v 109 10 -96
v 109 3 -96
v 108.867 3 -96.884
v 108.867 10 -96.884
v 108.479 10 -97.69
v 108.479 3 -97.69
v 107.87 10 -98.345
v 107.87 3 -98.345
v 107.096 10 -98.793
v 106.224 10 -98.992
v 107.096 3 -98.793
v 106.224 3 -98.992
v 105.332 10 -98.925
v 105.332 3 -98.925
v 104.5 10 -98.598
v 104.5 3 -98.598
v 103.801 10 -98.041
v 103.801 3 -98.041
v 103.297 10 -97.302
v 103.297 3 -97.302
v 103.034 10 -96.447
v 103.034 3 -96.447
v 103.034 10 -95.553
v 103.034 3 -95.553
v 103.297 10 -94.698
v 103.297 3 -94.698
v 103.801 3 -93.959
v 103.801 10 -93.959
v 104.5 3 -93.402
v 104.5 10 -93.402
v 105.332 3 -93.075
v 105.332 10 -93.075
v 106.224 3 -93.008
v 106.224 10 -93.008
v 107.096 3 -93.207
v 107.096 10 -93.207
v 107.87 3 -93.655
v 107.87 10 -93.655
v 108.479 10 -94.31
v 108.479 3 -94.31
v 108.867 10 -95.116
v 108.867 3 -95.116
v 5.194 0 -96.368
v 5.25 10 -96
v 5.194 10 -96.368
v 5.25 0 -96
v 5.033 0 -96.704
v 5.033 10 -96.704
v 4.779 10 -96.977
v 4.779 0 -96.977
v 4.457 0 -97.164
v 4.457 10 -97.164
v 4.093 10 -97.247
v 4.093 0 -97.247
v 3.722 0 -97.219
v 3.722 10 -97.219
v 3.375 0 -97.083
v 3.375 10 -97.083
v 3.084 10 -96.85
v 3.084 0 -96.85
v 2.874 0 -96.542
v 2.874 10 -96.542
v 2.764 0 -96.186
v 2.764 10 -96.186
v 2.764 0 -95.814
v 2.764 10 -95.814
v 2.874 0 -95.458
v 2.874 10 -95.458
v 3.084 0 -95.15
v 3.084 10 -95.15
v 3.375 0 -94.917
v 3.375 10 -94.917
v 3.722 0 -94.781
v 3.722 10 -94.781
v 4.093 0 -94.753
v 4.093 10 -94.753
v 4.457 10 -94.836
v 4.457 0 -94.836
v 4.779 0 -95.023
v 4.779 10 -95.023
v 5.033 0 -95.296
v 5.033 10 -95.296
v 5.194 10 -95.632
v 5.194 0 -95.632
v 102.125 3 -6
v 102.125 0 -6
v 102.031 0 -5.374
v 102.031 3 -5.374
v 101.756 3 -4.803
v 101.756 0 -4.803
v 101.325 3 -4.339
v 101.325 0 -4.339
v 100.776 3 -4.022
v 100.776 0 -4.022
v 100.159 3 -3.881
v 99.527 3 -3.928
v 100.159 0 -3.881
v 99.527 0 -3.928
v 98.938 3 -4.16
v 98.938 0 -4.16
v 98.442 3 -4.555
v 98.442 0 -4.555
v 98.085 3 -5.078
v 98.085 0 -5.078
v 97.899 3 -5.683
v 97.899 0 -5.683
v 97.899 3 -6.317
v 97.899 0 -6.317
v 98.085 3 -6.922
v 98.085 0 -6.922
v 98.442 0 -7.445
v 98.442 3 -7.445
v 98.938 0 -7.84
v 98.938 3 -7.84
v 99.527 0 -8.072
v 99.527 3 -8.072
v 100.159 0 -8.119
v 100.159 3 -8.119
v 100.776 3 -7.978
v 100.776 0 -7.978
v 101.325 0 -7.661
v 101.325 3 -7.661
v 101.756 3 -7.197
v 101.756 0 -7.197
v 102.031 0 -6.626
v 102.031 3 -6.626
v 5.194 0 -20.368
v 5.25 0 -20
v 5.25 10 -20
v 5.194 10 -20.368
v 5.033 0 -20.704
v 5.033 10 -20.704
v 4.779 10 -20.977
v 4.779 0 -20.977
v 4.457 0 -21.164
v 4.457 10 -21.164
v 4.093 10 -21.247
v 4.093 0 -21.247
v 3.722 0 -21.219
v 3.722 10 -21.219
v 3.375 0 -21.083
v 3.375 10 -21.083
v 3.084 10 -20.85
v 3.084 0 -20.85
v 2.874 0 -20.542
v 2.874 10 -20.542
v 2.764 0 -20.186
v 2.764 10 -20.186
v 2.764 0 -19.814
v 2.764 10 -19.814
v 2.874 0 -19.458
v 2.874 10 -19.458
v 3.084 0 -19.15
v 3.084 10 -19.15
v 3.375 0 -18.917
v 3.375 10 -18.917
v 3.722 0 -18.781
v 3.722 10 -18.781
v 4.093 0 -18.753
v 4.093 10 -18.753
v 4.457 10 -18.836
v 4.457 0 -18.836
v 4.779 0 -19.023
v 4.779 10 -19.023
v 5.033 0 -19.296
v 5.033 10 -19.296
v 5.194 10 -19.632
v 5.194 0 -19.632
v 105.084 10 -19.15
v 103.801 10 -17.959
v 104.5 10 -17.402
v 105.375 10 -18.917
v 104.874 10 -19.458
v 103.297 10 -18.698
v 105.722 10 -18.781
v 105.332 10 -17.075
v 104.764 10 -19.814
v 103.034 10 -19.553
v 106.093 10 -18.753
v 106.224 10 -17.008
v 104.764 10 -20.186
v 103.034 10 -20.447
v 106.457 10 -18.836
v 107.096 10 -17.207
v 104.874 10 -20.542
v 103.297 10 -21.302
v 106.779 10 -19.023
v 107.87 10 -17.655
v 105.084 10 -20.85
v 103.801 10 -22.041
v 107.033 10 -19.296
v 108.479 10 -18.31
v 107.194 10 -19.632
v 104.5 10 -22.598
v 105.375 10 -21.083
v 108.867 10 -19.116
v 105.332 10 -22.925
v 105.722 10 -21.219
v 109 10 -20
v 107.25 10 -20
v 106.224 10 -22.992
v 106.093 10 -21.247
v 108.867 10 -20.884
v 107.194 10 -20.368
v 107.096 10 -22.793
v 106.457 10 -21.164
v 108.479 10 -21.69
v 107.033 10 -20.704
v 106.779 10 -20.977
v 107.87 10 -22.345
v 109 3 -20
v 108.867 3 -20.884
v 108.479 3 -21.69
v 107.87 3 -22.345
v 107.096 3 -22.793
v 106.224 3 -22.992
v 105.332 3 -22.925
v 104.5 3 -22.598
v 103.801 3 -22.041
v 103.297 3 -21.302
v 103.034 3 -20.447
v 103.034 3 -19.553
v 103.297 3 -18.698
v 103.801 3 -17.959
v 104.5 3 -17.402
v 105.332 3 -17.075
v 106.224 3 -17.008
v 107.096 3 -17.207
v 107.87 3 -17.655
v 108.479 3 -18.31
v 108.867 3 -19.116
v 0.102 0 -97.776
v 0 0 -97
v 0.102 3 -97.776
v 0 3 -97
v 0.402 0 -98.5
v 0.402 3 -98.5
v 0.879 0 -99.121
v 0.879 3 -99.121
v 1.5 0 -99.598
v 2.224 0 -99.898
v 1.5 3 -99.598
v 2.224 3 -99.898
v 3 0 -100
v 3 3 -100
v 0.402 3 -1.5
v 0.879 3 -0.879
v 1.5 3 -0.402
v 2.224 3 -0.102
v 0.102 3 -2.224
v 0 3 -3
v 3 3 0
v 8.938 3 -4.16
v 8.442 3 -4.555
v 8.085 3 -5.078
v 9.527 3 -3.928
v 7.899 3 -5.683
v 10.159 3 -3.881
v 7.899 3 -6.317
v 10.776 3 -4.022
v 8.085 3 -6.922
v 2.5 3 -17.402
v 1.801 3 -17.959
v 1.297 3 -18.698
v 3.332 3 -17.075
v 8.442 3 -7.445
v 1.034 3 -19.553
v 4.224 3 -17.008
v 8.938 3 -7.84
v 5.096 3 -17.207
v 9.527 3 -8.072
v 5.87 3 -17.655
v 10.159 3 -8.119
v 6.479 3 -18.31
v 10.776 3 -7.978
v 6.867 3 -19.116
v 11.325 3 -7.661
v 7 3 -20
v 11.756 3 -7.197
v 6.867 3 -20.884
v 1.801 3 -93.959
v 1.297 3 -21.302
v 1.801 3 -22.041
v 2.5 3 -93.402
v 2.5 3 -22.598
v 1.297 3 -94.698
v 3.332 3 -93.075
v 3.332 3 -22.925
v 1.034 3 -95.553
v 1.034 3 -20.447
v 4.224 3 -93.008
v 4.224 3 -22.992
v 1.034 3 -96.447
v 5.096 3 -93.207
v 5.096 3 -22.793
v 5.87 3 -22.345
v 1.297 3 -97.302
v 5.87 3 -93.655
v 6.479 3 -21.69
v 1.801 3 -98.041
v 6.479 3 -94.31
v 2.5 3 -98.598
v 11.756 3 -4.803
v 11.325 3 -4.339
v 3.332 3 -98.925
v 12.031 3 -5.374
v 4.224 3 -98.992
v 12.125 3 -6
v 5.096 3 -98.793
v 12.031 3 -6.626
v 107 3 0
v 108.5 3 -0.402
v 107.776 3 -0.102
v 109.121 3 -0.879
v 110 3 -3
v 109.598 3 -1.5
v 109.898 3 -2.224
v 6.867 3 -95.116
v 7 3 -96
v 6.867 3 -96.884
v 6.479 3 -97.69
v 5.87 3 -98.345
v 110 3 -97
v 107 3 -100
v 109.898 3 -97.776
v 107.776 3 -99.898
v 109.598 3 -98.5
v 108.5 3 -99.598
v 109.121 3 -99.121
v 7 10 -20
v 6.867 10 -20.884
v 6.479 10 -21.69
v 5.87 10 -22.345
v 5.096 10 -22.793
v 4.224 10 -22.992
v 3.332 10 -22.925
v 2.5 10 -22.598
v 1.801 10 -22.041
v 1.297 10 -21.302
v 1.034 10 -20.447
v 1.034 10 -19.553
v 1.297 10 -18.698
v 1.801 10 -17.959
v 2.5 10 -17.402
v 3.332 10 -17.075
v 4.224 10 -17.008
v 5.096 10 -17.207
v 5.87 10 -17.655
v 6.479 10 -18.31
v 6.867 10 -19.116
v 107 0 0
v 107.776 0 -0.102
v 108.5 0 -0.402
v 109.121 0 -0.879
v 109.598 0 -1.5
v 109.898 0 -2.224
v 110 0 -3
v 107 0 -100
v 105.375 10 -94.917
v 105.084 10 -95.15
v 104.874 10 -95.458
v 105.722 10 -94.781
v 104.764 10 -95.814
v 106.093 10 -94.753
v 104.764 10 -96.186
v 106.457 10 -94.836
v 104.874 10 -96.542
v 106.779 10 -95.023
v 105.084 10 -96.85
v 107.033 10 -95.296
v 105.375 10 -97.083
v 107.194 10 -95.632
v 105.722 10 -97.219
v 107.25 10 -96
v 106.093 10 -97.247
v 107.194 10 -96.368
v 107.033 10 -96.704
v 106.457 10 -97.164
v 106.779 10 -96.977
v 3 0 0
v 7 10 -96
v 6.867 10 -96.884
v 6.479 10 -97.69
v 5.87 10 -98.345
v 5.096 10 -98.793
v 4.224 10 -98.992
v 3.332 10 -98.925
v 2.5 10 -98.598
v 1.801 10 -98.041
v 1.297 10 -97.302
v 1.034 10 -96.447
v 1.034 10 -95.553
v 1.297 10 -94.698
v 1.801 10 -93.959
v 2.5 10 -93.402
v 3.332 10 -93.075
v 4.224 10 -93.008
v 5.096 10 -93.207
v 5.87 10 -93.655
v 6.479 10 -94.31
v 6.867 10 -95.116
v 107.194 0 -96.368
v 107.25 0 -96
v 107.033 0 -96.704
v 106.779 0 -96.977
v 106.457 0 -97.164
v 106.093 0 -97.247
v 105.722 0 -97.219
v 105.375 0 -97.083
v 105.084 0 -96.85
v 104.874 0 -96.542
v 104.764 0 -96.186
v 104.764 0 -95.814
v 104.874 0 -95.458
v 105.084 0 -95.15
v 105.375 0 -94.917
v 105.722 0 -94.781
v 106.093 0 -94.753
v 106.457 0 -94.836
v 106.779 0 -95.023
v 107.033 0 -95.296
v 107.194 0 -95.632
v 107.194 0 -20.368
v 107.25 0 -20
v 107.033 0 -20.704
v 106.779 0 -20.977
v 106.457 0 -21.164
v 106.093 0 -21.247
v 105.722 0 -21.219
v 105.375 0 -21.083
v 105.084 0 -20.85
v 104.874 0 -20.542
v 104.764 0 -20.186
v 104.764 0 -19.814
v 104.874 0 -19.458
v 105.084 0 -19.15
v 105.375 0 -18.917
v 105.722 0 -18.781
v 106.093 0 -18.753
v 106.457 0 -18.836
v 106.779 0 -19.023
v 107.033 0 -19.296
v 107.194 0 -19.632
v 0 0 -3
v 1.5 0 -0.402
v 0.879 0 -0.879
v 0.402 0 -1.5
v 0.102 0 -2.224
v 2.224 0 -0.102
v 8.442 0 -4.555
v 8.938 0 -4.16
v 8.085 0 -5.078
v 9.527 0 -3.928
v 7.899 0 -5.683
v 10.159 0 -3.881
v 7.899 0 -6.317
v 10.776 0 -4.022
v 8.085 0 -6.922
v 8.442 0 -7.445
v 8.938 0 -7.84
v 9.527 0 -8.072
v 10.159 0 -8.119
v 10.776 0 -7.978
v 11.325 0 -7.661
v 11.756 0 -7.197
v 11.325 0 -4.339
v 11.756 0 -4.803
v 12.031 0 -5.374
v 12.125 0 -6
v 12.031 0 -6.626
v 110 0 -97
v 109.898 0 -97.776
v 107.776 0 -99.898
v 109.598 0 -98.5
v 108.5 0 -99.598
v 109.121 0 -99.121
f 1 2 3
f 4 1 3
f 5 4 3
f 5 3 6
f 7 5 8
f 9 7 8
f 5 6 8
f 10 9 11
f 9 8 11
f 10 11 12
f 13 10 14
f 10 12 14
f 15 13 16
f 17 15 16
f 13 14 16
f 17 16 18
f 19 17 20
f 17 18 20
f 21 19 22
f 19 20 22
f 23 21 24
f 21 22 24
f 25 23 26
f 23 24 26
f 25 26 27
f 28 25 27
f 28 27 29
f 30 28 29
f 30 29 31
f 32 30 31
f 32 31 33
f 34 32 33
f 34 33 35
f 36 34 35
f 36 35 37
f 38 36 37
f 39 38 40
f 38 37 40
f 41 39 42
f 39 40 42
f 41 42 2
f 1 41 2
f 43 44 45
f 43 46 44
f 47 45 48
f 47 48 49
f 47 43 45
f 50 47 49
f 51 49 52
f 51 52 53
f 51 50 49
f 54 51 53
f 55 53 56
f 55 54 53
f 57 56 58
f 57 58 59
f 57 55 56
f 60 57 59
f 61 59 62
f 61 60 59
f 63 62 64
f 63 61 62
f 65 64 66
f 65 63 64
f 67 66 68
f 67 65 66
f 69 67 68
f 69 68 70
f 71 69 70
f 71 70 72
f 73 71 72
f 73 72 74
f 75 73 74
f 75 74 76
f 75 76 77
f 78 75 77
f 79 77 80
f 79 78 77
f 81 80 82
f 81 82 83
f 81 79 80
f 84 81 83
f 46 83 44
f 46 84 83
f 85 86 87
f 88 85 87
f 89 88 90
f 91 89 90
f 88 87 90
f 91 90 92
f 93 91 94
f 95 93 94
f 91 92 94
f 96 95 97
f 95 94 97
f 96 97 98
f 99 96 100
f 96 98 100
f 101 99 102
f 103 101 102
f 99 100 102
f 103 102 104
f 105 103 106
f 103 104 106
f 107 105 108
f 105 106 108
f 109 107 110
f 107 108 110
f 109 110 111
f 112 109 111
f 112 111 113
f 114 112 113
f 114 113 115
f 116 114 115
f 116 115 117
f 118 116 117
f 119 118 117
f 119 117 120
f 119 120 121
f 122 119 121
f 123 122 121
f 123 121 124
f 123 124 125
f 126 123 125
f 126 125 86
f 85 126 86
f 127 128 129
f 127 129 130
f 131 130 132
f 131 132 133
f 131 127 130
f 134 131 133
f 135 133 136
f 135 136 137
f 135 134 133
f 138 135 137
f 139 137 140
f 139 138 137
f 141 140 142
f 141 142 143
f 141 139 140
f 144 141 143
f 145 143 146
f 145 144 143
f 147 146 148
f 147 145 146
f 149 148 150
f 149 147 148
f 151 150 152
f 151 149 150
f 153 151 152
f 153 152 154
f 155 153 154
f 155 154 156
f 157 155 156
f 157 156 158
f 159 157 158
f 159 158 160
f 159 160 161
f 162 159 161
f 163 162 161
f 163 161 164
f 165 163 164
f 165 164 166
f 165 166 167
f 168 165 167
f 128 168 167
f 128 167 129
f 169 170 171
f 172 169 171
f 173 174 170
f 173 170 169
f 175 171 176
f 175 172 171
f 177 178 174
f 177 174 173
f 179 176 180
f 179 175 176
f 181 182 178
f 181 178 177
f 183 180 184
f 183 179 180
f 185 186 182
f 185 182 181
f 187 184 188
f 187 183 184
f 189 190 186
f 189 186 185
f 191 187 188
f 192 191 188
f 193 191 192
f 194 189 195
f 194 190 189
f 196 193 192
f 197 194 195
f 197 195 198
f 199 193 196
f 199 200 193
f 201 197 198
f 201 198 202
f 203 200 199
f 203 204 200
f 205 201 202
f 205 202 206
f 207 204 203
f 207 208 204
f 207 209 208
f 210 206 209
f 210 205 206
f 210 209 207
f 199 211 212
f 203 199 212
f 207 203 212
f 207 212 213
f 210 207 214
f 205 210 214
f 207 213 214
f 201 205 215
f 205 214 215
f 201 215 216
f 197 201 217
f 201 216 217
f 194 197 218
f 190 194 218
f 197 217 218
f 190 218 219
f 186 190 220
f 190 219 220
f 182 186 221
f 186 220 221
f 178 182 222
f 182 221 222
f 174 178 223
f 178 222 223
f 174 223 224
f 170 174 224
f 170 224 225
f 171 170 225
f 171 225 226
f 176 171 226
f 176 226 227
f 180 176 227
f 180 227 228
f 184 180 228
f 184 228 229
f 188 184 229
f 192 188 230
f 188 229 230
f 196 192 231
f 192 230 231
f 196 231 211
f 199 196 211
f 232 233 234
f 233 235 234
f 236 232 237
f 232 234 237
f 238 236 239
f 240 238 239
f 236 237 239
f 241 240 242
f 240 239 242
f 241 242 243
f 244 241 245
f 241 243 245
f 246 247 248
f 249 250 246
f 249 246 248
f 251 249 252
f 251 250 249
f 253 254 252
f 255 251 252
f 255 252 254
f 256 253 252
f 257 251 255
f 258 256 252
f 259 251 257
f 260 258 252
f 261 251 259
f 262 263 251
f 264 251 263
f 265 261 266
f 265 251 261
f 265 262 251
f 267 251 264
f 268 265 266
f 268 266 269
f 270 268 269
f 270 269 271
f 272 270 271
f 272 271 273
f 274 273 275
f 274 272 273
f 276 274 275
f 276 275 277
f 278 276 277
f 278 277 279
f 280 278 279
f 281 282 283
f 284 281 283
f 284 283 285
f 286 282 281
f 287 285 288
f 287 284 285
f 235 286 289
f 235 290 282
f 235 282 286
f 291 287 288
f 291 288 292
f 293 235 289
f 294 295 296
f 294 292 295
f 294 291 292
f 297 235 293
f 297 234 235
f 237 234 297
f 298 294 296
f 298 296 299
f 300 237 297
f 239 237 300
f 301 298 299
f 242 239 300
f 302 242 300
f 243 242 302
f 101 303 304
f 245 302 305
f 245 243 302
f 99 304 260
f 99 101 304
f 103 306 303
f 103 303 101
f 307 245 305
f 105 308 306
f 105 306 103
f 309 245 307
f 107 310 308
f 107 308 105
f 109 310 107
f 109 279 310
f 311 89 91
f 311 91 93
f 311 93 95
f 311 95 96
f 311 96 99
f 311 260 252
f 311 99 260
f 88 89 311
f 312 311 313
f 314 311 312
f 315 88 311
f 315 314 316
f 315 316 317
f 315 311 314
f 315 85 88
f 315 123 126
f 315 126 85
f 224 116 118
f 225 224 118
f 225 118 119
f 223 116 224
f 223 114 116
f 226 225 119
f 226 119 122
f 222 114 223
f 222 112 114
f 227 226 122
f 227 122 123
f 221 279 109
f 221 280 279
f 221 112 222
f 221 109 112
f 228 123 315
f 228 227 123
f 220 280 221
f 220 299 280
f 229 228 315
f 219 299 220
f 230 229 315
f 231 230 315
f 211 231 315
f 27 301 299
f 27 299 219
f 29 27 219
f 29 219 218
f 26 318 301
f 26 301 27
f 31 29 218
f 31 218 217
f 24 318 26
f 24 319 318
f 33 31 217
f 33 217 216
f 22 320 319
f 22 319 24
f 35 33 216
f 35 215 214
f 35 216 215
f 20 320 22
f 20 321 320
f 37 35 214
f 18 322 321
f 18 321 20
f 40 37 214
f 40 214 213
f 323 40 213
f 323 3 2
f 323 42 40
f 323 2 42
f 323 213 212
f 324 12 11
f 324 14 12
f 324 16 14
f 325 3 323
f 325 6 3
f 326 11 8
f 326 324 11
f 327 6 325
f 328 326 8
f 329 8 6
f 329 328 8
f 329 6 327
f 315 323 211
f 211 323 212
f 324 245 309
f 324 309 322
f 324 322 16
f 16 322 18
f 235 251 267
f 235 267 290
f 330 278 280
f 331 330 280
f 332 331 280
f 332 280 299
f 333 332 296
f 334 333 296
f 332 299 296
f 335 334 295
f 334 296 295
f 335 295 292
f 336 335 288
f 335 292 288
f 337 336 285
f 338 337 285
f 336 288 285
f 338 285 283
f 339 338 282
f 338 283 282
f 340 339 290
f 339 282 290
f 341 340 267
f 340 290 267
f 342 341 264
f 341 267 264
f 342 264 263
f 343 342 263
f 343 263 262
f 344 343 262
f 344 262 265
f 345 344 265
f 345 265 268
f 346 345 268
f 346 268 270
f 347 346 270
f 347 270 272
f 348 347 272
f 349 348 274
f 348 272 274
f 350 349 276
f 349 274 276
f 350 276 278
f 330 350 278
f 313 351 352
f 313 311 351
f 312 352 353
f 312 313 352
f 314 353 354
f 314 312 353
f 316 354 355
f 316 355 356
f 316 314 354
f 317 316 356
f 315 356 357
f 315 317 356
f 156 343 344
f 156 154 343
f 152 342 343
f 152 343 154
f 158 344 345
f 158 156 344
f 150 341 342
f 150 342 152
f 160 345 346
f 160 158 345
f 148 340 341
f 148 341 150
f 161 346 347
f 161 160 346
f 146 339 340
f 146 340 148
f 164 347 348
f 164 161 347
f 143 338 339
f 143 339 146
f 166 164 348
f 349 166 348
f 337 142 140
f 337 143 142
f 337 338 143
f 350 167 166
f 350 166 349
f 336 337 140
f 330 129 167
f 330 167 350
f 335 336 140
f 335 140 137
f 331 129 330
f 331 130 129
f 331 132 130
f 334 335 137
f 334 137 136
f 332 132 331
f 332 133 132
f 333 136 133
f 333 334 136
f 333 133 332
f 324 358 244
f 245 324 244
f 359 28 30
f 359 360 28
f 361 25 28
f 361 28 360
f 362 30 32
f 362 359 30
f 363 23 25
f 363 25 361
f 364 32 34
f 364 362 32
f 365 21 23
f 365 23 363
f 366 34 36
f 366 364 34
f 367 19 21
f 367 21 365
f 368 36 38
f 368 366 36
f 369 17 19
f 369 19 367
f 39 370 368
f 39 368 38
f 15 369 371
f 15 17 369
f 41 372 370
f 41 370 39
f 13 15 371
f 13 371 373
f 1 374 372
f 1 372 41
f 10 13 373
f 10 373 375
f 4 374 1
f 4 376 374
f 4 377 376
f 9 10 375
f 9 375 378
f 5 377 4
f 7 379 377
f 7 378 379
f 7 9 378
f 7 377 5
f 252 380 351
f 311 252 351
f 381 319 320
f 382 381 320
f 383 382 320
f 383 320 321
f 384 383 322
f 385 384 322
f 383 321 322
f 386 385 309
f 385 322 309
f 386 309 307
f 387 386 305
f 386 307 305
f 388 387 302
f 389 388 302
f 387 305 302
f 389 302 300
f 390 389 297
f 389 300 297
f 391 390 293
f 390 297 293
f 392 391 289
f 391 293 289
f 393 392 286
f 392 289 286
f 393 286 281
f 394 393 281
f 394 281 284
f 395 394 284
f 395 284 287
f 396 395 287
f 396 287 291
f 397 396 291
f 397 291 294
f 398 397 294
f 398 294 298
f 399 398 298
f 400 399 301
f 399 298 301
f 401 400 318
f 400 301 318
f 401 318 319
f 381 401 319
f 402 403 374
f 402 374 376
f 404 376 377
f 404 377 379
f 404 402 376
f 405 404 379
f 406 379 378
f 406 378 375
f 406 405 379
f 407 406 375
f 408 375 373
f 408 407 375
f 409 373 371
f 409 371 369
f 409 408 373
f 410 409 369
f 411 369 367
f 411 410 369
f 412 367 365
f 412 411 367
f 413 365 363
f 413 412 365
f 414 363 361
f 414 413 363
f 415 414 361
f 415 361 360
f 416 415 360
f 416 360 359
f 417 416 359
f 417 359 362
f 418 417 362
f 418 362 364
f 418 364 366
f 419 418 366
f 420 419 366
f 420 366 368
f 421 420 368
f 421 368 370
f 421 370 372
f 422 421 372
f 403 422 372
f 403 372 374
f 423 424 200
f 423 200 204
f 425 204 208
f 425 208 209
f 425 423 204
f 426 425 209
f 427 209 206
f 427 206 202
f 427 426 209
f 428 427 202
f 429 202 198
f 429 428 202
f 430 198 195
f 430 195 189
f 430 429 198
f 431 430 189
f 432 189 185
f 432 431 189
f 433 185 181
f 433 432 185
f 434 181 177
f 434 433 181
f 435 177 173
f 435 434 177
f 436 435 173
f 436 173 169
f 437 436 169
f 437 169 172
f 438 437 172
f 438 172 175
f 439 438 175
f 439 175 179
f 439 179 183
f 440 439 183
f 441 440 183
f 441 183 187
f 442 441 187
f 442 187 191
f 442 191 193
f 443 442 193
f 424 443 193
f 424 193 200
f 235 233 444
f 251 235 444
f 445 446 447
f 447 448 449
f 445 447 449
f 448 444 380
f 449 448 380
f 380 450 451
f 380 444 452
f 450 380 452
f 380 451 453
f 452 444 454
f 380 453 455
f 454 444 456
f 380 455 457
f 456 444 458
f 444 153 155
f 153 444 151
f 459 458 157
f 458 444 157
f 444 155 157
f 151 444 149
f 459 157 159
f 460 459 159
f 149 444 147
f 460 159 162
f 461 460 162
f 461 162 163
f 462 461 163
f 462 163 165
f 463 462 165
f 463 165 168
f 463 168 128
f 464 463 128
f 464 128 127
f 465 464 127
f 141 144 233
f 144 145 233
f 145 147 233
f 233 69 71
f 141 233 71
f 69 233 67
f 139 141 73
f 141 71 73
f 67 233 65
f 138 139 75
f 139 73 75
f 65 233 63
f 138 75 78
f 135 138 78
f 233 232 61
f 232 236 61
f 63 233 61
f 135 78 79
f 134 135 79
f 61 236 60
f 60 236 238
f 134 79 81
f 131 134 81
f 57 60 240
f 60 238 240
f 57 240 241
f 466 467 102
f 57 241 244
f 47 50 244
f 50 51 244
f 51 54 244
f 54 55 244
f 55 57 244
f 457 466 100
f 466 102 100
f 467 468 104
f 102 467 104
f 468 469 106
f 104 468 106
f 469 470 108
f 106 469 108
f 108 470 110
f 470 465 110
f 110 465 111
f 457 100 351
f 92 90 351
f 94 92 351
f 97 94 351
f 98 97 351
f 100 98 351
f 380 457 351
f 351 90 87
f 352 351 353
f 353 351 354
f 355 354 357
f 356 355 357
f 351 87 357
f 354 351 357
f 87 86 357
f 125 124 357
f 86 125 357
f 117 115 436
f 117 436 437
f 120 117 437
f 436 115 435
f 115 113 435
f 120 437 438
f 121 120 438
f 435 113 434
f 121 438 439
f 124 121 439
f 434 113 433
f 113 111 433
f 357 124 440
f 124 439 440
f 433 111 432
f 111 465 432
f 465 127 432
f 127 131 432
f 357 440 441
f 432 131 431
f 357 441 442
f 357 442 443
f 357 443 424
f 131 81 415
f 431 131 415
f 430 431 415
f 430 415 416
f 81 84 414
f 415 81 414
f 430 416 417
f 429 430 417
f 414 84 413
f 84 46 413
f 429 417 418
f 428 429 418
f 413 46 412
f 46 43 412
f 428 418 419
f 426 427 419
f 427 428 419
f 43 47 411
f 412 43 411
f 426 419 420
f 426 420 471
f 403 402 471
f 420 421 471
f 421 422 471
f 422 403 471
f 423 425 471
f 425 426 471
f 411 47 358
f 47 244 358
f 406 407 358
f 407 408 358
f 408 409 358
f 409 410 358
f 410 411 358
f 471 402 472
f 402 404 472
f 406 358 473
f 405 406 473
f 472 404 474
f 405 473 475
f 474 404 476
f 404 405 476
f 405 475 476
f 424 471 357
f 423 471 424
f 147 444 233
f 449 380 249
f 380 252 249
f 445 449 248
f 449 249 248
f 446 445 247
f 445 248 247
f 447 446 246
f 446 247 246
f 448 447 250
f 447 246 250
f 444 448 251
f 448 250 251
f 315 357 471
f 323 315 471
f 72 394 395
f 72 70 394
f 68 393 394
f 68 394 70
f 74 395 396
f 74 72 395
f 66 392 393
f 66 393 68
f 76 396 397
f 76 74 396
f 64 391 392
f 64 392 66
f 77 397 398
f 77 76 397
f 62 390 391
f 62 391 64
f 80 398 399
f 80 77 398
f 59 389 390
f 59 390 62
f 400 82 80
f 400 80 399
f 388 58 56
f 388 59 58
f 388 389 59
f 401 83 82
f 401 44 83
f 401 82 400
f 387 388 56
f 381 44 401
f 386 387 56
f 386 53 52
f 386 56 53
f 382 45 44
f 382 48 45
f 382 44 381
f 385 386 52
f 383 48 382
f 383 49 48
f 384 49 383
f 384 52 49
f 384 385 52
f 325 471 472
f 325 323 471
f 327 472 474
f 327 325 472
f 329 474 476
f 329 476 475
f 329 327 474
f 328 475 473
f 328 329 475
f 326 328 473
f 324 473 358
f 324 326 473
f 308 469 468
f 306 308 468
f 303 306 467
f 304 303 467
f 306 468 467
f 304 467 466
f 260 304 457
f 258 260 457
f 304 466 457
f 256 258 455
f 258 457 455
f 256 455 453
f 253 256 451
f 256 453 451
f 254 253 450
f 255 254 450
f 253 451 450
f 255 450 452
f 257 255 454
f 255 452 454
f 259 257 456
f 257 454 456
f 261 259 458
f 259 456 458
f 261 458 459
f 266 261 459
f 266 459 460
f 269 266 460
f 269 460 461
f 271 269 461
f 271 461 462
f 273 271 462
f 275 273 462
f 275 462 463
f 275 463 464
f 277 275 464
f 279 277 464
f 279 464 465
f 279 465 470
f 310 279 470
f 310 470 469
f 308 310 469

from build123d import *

# Parameters (mm, degrees)
SKETCH1_R           = 1.25
BOSS_EXTRUDE1_DEPTH = 3
FILLET1_R           = 3
SKETCH2_R           = 3
SKETCH2_R_2         = 1.25
BOSS_EXTRUDE2_DEPTH = 7
SKETCH4_R           = 2.125
CUT_EXTRUDE1_DEPTH  = 11


with BuildPart() as part:
    # Sketch1 → Boss-Extrude1 (new body)
    with BuildSketch(Plane(origin=(0, 0, 0), x_dir=(1, 0, 0), z_dir=(0, 1, 0))):
        Polygon((0, 0), (110, 0), (110, 16), (110, 100), (0, 100), (0, 16), align=None)
        with Locations((4, 96)):
            Circle(SKETCH1_R, mode=Mode.SUBTRACT)
        with Locations((106, 96)):
            Circle(SKETCH1_R, mode=Mode.SUBTRACT)
        with Locations((106, 20)):
            Circle(SKETCH1_R, mode=Mode.SUBTRACT)
        with Locations((4, 20)):
            Circle(SKETCH1_R, mode=Mode.SUBTRACT)
    extrude(amount=BOSS_EXTRUDE1_DEPTH)

    # Fillet1
    fillet1_edges = [part.edges().sort_by_distance(p)[0] for p in [
        (0, 1.5, -100),
        (110, 1.5, -100),
        (110, 1.5, 0),
        (0, 1.5, 0),
    ]]
    fillet(fillet1_edges, radius=FILLET1_R)

    # Sketch2 → Boss-Extrude2 (add)
    with BuildSketch(Plane(origin=(0, 3, 0), x_dir=(1, 0, 0), z_dir=(0, 1, 0))):
        with Locations((4, 96)):
            Circle(SKETCH2_R)
        with Locations((4, 96)):
            Circle(SKETCH2_R_2, mode=Mode.SUBTRACT)
        with Locations((106, 96)):
            Circle(SKETCH2_R)
        with Locations((106, 96)):
            Circle(SKETCH2_R_2, mode=Mode.SUBTRACT)
        with Locations((106, 20)):
            Circle(SKETCH2_R)
        with Locations((106, 20)):
            Circle(SKETCH2_R_2, mode=Mode.SUBTRACT)
        with Locations((4, 20)):
            Circle(SKETCH2_R)
        with Locations((4, 20)):
            Circle(SKETCH2_R_2, mode=Mode.SUBTRACT)
    extrude(amount=BOSS_EXTRUDE2_DEPTH)

    # Sketch4 → Cut-Extrude1 (cut, through all)
    with BuildSketch(Plane.XZ):
        with Locations((10, -6)):
            Circle(SKETCH4_R)
        with Locations((100, -6)):
            Circle(SKETCH4_R)
    extrude(amount=-CUT_EXTRUDE1_DEPTH, mode=Mode.SUBTRACT)


solid = part.part
